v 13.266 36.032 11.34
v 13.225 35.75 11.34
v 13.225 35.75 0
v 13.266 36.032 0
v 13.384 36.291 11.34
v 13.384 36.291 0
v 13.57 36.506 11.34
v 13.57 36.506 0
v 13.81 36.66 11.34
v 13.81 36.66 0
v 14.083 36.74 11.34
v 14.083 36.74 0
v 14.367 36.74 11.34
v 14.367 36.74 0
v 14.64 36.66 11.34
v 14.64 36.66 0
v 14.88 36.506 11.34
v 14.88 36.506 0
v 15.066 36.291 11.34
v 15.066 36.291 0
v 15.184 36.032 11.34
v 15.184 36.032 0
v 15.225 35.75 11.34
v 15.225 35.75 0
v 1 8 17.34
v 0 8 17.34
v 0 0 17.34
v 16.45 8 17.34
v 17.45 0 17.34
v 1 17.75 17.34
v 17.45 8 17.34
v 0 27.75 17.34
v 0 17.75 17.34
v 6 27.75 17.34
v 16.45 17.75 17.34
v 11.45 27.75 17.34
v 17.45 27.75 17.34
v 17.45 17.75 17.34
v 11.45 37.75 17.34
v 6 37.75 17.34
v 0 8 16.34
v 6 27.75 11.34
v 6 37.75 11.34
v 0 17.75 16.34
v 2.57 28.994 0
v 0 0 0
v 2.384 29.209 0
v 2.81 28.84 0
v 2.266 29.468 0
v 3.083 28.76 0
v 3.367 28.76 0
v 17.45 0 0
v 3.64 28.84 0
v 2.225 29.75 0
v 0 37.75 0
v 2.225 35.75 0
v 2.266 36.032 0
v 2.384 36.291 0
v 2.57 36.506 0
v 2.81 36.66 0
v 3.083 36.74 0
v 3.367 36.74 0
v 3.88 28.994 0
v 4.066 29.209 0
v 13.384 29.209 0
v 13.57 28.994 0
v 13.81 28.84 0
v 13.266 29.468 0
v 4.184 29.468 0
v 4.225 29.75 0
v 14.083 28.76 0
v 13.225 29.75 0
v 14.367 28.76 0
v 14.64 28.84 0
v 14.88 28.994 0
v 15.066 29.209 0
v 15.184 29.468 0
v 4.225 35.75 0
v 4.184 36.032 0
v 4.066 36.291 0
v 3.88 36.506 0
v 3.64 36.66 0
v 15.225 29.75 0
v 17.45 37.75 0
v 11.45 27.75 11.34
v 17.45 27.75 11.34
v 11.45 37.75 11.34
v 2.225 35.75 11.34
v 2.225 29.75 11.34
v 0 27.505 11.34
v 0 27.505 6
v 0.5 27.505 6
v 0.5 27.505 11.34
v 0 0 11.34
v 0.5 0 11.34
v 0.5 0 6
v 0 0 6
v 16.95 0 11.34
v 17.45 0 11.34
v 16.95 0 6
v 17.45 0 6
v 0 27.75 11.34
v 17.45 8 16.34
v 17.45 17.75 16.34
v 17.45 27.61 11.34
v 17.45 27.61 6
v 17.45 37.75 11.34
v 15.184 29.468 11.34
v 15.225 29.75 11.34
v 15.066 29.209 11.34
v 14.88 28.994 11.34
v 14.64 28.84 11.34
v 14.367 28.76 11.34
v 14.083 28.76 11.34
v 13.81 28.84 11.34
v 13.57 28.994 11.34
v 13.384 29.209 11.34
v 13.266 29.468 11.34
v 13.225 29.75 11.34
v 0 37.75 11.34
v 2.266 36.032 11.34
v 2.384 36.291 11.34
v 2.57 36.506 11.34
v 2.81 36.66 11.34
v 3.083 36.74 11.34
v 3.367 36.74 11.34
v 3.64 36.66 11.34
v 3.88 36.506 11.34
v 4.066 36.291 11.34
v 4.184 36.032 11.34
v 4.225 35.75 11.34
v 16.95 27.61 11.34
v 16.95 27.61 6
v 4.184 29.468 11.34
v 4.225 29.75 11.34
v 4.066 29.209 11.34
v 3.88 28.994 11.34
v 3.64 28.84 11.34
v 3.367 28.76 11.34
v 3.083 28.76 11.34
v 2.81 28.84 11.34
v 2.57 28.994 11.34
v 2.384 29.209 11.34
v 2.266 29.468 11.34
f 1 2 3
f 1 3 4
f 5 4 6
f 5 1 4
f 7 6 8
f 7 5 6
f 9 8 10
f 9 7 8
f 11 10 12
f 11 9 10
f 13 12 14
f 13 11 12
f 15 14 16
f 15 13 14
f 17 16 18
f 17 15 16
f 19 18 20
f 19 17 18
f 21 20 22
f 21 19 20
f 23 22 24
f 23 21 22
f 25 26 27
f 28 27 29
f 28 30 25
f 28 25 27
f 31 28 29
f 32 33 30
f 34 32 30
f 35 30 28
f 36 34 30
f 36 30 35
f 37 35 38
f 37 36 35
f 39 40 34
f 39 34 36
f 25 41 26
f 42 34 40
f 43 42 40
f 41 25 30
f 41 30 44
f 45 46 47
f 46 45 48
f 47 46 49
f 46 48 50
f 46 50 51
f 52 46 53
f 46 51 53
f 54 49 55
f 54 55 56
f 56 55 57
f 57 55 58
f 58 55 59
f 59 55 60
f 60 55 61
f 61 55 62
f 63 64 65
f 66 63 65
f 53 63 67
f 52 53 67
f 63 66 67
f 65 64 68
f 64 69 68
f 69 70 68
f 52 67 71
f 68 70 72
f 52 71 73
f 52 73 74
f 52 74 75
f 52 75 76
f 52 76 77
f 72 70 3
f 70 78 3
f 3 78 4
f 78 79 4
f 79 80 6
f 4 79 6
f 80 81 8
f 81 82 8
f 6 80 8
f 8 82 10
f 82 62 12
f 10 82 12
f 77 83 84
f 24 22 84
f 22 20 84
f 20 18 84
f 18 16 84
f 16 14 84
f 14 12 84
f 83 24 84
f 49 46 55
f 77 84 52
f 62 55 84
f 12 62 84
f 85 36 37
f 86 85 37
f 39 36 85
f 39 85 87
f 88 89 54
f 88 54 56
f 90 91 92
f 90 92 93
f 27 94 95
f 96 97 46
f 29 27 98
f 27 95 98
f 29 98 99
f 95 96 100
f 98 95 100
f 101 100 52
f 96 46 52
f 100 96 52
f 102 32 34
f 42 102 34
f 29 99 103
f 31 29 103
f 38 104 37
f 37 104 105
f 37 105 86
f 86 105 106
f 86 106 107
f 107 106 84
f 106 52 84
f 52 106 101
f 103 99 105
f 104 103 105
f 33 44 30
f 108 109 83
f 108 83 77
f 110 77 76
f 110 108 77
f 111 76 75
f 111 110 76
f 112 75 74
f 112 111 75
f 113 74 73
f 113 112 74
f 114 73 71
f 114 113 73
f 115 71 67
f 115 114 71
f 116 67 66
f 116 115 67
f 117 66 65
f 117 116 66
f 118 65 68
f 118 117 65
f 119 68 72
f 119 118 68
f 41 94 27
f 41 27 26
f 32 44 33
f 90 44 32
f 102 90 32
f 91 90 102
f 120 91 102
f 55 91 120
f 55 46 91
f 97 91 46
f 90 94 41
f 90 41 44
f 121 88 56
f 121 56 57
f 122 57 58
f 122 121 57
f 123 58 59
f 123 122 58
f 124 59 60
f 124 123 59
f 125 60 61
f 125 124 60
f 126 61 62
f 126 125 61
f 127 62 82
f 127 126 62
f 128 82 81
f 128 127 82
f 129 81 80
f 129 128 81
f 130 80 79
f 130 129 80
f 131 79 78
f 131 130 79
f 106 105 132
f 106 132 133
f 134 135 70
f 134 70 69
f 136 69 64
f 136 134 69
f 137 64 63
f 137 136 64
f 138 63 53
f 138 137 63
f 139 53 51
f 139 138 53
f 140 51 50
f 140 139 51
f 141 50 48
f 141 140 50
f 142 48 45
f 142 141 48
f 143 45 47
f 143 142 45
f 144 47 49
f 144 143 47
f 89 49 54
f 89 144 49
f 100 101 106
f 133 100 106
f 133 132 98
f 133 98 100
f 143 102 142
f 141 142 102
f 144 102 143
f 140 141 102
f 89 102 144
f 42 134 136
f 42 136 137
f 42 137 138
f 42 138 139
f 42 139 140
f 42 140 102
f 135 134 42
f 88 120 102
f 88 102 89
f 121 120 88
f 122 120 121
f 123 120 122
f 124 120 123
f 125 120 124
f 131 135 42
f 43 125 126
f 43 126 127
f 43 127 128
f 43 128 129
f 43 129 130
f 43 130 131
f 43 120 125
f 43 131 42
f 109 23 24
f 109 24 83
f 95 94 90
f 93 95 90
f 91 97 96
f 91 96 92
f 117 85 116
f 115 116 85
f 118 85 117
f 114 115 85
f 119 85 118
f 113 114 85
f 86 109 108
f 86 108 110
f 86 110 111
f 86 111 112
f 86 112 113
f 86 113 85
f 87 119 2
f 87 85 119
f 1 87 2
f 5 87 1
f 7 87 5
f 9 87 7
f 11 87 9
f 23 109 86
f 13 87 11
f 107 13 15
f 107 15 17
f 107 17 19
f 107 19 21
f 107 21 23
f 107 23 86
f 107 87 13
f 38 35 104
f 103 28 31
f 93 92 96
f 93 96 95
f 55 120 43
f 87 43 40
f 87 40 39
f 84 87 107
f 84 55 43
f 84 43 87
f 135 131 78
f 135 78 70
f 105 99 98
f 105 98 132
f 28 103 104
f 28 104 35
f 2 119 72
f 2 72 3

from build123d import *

# Parameters (mm, degrees)
SKETCH1_W                      = 17.45
SKETCH1_H                      = 37.75
PROFILEBOSS_EXTRUDE1_DEPTH     = 17.34
TOPINDENTSSKETCH2_W            = 6
TOPINDENTSSKETCH2_H            = 10
TOPINDENTCUT_EXTRUDE1_DEPTH    = 6
MOUNTSLOTCUTCUT_EXTRUDE2_DEPTH = 44.106386998
FRONTEDGECHAMFER1_START        = 8
FRONTEDGECHAMFER1_DEPTH        = 9.75
RIGHTSLOTSKETCH4_W             = 5.34
RIGHTSLOTSKETCH4_H             = 27.610084113
RIGHTSLOTCUT_EXTRUDE5_DEPTH    = 0.5
LEFTSLOTSKETCH5_W              = 5.34
LEFTSLOTSKETCH5_H              = 27.50506845
CUT_EXTRUDE8_DEPTH             = 0.5


with BuildPart() as part:
    # Sketch1 → ProfileBoss-Extrude1 (new body)
    with BuildSketch(Plane.XY):
        with Locations((8.725, 18.875)):
            Rectangle(SKETCH1_W, SKETCH1_H)
    extrude(amount=PROFILEBOSS_EXTRUDE1_DEPTH)

    # TopIndentsSketch2 → TopIndentCut-Extrude1 (cut)
    with BuildSketch(Plane.XY.offset(17.34)):
        with Locations((14.45, 32.75)):
            Rectangle(TOPINDENTSSKETCH2_W, TOPINDENTSSKETCH2_H)
        with Locations((3, 32.75)):
            Rectangle(TOPINDENTSSKETCH2_W, TOPINDENTSSKETCH2_H)
    extrude(amount=-TOPINDENTCUT_EXTRUDE1_DEPTH, mode=Mode.SUBTRACT)

    # Sketch3 → MountSlotCutCut-Extrude2 (cut, through all)
    with BuildSketch(Plane.XY.offset(11.34)):
        with BuildLine():
            Line((13.225, 29.75), (13.225, 35.75))
            ThreePointArc((13.225, 35.75), (14.225, 36.75), (15.225, 35.75))
            Line((15.225, 35.75), (15.225, 29.75))
            ThreePointArc((15.225, 29.75), (14.225, 28.75), (13.225, 29.75))
        make_face()
        with BuildLine():
            Line((2.225, 29.75), (2.225, 35.75))
            ThreePointArc((2.225, 35.75), (3.225, 36.75), (4.225, 35.75))
            Line((4.225, 35.75), (4.225, 29.75))
            ThreePointArc((4.225, 29.75), (3.225, 28.75), (2.225, 29.75))
        make_face()
    extrude(amount=-MOUNTSLOTCUTCUT_EXTRUDE2_DEPTH, mode=Mode.SUBTRACT)

    # FrontEdgeChamfer1: read off the stored shape, not the designer's step
    # FrontEdgeChamfer1 outline → FrontEdgeChamfer1 (cut)
    with BuildSketch(Plane(origin=(0, 0, 0), x_dir=(1, 0, 0), z_dir=(0, 1, 0)).offset(FRONTEDGECHAMFER1_START)):
        Polygon((17.45, -17.34), (17.45, -16.34), (16.45, -17.34), align=None)
        Polygon((0, -17.34), (1, -17.34), (0, -16.34), align=None)
    extrude(amount=FRONTEDGECHAMFER1_DEPTH, mode=Mode.SUBTRACT)

    # RightSlotSketch4 → RightSlotCut-Extrude5 (cut)
    with BuildSketch(Plane(origin=(17.45, 0, 0), x_dir=(0, 0, -1), z_dir=(1, 0, 0))):
        with Locations((-8.67, 13.805042057)):
            Rectangle(RIGHTSLOTSKETCH4_W, RIGHTSLOTSKETCH4_H)
    extrude(amount=-RIGHTSLOTCUT_EXTRUDE5_DEPTH, mode=Mode.SUBTRACT)

    # LeftSlotSketch5 → Cut-Extrude8 (cut)
    with BuildSketch(Plane.ZY):
        with Locations((8.67, 13.752534225)):
            Rectangle(LEFTSLOTSKETCH5_W, LEFTSLOTSKETCH5_H)
    extrude(amount=-CUT_EXTRUDE8_DEPTH, mode=Mode.SUBTRACT)


solid = part.part
